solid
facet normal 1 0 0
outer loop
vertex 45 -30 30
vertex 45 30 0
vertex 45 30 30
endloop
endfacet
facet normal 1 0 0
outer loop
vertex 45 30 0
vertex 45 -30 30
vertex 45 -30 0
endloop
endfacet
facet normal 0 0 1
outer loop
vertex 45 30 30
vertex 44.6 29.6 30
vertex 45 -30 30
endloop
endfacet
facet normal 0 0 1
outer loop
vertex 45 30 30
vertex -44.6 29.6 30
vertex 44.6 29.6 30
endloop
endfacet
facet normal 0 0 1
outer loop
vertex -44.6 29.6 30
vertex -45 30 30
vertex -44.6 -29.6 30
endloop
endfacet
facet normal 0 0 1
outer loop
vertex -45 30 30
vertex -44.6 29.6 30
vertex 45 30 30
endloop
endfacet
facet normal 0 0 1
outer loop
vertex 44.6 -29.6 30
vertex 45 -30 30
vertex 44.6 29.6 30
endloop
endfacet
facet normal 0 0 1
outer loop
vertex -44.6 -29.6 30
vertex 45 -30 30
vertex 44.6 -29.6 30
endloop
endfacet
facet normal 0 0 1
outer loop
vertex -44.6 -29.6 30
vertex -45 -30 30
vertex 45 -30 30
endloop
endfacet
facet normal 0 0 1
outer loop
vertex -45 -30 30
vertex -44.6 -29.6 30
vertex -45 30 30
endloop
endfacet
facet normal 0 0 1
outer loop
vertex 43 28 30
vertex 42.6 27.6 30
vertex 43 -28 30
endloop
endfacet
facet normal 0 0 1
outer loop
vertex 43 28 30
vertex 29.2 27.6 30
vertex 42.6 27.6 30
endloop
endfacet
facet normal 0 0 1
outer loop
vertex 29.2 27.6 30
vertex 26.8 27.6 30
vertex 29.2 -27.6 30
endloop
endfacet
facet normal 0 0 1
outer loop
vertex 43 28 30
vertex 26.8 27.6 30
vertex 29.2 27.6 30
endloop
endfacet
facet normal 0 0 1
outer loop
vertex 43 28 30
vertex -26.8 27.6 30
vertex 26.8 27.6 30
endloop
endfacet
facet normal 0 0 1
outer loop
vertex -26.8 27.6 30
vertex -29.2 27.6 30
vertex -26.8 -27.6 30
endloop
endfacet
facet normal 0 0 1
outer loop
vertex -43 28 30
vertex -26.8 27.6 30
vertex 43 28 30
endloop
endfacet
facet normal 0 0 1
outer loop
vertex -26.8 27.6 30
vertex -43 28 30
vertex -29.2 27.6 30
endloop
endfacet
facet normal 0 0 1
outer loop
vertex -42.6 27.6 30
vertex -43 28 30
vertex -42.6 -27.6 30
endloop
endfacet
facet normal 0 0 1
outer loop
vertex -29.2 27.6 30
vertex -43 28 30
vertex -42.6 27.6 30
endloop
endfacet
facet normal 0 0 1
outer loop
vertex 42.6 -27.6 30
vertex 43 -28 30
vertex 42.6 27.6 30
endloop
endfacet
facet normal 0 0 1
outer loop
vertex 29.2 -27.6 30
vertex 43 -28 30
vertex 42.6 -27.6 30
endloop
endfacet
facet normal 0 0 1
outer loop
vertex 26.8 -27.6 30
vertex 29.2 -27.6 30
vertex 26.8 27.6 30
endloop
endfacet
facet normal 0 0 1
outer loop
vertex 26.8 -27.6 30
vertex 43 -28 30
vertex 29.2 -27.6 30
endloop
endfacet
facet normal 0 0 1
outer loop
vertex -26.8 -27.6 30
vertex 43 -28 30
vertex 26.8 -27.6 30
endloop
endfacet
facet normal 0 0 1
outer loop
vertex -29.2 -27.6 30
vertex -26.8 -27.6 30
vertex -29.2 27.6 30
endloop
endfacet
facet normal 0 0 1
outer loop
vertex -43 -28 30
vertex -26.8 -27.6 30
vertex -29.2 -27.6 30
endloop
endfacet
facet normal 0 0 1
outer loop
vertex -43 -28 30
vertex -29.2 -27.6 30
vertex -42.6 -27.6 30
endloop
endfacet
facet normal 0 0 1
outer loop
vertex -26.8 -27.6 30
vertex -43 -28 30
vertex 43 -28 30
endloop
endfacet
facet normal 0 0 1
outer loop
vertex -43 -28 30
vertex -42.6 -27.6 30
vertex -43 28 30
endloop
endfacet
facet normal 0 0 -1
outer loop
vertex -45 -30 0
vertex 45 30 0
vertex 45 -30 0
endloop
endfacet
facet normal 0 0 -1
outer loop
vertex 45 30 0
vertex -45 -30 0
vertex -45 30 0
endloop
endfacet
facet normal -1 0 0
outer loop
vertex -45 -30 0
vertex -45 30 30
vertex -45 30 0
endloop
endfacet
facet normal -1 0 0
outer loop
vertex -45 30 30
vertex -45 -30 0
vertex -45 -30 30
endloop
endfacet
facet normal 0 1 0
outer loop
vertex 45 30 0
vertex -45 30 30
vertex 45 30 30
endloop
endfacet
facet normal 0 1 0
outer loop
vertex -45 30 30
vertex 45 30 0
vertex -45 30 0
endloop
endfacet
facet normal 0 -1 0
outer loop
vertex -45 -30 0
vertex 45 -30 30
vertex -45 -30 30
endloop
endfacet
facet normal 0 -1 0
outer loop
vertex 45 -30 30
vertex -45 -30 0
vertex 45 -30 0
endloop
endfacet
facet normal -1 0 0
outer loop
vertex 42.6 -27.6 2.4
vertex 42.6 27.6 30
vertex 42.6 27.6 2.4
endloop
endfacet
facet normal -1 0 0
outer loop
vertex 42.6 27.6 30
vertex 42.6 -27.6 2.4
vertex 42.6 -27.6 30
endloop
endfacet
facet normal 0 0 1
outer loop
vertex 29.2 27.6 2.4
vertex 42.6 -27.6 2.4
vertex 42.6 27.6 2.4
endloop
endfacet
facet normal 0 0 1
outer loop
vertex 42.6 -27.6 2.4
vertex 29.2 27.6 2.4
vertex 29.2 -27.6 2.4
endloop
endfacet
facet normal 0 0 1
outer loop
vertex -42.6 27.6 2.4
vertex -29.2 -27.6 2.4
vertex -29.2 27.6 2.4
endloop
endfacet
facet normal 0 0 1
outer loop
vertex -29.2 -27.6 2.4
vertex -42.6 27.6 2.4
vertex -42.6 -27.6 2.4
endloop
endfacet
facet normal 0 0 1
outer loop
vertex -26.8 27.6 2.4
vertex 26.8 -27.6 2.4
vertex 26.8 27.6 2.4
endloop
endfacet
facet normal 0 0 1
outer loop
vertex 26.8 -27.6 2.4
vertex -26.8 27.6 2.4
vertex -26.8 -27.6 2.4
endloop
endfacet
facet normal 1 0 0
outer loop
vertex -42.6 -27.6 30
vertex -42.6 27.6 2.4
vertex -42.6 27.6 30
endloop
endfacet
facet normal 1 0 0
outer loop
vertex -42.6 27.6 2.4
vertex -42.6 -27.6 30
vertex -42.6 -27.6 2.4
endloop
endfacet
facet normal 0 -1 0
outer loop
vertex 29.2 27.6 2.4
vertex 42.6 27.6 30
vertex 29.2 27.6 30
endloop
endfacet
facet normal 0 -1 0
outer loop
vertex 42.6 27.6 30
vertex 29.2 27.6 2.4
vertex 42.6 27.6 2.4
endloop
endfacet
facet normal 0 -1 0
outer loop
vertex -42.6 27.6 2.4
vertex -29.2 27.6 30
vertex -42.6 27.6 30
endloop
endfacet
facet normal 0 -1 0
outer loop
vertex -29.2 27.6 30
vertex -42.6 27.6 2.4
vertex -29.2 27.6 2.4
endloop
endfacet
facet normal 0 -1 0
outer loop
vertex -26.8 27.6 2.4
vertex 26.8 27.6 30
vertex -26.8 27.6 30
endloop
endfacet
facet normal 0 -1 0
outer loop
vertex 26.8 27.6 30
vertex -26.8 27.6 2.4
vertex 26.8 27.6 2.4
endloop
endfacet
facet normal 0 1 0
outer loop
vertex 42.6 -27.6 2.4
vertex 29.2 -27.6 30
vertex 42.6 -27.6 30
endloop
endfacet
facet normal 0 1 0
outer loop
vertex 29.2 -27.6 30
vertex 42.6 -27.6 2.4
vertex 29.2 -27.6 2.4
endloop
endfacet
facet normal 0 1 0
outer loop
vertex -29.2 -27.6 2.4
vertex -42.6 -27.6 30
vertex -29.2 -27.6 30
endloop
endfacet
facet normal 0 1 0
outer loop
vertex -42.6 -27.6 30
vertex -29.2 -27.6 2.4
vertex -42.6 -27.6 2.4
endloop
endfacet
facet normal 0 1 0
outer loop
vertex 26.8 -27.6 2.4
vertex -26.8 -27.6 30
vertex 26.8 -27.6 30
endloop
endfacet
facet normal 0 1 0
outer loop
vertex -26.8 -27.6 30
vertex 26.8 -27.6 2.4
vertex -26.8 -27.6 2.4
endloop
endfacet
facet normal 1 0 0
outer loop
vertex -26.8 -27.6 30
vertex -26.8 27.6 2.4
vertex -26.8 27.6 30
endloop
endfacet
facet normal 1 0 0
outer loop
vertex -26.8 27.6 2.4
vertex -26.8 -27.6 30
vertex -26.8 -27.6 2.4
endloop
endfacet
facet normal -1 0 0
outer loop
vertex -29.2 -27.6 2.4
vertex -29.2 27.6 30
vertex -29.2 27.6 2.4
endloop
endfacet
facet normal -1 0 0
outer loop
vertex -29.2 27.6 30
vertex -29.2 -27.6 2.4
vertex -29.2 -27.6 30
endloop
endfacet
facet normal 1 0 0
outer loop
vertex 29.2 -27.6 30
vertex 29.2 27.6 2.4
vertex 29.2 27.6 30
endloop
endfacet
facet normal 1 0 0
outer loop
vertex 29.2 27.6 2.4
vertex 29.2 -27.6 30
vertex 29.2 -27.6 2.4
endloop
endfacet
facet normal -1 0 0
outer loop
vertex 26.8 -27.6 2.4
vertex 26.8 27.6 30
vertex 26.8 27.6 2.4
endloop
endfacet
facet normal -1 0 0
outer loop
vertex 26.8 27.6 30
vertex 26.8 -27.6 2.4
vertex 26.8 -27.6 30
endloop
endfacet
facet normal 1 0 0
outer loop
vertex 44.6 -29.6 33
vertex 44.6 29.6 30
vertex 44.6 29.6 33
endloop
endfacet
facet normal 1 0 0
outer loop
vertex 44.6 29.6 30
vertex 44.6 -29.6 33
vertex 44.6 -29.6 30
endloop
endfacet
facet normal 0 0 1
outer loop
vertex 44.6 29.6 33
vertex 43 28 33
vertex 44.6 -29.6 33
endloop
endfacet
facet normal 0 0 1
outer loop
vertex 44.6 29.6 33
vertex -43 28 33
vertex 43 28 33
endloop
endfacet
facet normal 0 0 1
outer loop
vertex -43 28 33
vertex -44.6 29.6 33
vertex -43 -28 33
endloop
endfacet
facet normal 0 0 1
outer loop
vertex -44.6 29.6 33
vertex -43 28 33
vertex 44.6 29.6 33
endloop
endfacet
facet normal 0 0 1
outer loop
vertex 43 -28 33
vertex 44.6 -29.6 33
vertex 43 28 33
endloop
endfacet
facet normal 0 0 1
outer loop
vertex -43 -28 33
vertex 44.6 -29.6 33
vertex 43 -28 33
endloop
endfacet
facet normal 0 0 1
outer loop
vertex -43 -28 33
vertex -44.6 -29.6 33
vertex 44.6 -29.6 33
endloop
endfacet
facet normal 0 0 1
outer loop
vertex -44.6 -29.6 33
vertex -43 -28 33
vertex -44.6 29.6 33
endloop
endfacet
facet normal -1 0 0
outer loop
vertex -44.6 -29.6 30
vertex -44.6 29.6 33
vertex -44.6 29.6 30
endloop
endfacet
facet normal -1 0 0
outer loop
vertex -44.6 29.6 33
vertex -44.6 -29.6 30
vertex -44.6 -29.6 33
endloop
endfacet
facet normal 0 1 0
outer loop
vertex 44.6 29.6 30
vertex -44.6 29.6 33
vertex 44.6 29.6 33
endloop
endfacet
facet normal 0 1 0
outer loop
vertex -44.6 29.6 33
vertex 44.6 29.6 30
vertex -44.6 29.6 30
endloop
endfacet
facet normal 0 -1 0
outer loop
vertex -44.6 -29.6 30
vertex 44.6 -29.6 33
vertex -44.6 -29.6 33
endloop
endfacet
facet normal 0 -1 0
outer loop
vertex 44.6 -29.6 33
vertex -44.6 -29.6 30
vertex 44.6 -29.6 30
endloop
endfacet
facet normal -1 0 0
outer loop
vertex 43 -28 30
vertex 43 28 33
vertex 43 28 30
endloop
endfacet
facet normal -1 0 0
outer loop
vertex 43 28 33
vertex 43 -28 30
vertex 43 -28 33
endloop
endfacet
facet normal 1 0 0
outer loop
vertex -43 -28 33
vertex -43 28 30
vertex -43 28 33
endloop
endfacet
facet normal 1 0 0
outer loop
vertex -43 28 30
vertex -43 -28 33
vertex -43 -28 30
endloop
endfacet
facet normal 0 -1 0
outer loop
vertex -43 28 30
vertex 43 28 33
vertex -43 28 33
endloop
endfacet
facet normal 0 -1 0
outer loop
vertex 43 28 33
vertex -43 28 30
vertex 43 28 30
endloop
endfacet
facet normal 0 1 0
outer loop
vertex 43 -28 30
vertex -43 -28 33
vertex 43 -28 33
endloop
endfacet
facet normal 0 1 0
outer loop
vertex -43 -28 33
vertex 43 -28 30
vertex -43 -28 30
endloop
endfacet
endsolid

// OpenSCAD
// t3-005 open-top storage box with dividers and lid lip
outer_length = 90;
outer_width = 60;
outer_height = 30;
wall_thickness = 2.4;
divider_x = 28;
lip_thickness = 1.6;
lip_height = 3;
lip_inset = (wall_thickness - lip_thickness) / 2;

module rect_ring(l, w, t, h) {
    difference() {
        translate([-l / 2, -w / 2, 0]) cube([l, w, h]);
        translate([-l / 2 + t, -w / 2 + t, -1]) cube([l - 2 * t, w - 2 * t, h + 2]);
    }
}

union() {
    difference() {
        translate([-outer_length / 2, -outer_width / 2, 0])
            cube([outer_length, outer_width, outer_height]);
        translate([-outer_length / 2 + wall_thickness, -outer_width / 2 + wall_thickness, wall_thickness])
            cube([outer_length - 2 * wall_thickness, outer_width - 2 * wall_thickness, outer_height]);
    }
    // dividers overlap walls/floor slightly for a clean union
    for (s = [-1, 1])
        translate([s * divider_x - wall_thickness / 2, -outer_width / 2 + wall_thickness - 0.01, wall_thickness - 0.01])
            cube([wall_thickness, outer_width - 2 * wall_thickness + 0.02, outer_height - wall_thickness + 0.01]);
    translate([0, 0, outer_height - 0.01])
        rect_ring(outer_length - 2 * lip_inset, outer_width - 2 * lip_inset, lip_thickness, lip_height + 0.01);
}
